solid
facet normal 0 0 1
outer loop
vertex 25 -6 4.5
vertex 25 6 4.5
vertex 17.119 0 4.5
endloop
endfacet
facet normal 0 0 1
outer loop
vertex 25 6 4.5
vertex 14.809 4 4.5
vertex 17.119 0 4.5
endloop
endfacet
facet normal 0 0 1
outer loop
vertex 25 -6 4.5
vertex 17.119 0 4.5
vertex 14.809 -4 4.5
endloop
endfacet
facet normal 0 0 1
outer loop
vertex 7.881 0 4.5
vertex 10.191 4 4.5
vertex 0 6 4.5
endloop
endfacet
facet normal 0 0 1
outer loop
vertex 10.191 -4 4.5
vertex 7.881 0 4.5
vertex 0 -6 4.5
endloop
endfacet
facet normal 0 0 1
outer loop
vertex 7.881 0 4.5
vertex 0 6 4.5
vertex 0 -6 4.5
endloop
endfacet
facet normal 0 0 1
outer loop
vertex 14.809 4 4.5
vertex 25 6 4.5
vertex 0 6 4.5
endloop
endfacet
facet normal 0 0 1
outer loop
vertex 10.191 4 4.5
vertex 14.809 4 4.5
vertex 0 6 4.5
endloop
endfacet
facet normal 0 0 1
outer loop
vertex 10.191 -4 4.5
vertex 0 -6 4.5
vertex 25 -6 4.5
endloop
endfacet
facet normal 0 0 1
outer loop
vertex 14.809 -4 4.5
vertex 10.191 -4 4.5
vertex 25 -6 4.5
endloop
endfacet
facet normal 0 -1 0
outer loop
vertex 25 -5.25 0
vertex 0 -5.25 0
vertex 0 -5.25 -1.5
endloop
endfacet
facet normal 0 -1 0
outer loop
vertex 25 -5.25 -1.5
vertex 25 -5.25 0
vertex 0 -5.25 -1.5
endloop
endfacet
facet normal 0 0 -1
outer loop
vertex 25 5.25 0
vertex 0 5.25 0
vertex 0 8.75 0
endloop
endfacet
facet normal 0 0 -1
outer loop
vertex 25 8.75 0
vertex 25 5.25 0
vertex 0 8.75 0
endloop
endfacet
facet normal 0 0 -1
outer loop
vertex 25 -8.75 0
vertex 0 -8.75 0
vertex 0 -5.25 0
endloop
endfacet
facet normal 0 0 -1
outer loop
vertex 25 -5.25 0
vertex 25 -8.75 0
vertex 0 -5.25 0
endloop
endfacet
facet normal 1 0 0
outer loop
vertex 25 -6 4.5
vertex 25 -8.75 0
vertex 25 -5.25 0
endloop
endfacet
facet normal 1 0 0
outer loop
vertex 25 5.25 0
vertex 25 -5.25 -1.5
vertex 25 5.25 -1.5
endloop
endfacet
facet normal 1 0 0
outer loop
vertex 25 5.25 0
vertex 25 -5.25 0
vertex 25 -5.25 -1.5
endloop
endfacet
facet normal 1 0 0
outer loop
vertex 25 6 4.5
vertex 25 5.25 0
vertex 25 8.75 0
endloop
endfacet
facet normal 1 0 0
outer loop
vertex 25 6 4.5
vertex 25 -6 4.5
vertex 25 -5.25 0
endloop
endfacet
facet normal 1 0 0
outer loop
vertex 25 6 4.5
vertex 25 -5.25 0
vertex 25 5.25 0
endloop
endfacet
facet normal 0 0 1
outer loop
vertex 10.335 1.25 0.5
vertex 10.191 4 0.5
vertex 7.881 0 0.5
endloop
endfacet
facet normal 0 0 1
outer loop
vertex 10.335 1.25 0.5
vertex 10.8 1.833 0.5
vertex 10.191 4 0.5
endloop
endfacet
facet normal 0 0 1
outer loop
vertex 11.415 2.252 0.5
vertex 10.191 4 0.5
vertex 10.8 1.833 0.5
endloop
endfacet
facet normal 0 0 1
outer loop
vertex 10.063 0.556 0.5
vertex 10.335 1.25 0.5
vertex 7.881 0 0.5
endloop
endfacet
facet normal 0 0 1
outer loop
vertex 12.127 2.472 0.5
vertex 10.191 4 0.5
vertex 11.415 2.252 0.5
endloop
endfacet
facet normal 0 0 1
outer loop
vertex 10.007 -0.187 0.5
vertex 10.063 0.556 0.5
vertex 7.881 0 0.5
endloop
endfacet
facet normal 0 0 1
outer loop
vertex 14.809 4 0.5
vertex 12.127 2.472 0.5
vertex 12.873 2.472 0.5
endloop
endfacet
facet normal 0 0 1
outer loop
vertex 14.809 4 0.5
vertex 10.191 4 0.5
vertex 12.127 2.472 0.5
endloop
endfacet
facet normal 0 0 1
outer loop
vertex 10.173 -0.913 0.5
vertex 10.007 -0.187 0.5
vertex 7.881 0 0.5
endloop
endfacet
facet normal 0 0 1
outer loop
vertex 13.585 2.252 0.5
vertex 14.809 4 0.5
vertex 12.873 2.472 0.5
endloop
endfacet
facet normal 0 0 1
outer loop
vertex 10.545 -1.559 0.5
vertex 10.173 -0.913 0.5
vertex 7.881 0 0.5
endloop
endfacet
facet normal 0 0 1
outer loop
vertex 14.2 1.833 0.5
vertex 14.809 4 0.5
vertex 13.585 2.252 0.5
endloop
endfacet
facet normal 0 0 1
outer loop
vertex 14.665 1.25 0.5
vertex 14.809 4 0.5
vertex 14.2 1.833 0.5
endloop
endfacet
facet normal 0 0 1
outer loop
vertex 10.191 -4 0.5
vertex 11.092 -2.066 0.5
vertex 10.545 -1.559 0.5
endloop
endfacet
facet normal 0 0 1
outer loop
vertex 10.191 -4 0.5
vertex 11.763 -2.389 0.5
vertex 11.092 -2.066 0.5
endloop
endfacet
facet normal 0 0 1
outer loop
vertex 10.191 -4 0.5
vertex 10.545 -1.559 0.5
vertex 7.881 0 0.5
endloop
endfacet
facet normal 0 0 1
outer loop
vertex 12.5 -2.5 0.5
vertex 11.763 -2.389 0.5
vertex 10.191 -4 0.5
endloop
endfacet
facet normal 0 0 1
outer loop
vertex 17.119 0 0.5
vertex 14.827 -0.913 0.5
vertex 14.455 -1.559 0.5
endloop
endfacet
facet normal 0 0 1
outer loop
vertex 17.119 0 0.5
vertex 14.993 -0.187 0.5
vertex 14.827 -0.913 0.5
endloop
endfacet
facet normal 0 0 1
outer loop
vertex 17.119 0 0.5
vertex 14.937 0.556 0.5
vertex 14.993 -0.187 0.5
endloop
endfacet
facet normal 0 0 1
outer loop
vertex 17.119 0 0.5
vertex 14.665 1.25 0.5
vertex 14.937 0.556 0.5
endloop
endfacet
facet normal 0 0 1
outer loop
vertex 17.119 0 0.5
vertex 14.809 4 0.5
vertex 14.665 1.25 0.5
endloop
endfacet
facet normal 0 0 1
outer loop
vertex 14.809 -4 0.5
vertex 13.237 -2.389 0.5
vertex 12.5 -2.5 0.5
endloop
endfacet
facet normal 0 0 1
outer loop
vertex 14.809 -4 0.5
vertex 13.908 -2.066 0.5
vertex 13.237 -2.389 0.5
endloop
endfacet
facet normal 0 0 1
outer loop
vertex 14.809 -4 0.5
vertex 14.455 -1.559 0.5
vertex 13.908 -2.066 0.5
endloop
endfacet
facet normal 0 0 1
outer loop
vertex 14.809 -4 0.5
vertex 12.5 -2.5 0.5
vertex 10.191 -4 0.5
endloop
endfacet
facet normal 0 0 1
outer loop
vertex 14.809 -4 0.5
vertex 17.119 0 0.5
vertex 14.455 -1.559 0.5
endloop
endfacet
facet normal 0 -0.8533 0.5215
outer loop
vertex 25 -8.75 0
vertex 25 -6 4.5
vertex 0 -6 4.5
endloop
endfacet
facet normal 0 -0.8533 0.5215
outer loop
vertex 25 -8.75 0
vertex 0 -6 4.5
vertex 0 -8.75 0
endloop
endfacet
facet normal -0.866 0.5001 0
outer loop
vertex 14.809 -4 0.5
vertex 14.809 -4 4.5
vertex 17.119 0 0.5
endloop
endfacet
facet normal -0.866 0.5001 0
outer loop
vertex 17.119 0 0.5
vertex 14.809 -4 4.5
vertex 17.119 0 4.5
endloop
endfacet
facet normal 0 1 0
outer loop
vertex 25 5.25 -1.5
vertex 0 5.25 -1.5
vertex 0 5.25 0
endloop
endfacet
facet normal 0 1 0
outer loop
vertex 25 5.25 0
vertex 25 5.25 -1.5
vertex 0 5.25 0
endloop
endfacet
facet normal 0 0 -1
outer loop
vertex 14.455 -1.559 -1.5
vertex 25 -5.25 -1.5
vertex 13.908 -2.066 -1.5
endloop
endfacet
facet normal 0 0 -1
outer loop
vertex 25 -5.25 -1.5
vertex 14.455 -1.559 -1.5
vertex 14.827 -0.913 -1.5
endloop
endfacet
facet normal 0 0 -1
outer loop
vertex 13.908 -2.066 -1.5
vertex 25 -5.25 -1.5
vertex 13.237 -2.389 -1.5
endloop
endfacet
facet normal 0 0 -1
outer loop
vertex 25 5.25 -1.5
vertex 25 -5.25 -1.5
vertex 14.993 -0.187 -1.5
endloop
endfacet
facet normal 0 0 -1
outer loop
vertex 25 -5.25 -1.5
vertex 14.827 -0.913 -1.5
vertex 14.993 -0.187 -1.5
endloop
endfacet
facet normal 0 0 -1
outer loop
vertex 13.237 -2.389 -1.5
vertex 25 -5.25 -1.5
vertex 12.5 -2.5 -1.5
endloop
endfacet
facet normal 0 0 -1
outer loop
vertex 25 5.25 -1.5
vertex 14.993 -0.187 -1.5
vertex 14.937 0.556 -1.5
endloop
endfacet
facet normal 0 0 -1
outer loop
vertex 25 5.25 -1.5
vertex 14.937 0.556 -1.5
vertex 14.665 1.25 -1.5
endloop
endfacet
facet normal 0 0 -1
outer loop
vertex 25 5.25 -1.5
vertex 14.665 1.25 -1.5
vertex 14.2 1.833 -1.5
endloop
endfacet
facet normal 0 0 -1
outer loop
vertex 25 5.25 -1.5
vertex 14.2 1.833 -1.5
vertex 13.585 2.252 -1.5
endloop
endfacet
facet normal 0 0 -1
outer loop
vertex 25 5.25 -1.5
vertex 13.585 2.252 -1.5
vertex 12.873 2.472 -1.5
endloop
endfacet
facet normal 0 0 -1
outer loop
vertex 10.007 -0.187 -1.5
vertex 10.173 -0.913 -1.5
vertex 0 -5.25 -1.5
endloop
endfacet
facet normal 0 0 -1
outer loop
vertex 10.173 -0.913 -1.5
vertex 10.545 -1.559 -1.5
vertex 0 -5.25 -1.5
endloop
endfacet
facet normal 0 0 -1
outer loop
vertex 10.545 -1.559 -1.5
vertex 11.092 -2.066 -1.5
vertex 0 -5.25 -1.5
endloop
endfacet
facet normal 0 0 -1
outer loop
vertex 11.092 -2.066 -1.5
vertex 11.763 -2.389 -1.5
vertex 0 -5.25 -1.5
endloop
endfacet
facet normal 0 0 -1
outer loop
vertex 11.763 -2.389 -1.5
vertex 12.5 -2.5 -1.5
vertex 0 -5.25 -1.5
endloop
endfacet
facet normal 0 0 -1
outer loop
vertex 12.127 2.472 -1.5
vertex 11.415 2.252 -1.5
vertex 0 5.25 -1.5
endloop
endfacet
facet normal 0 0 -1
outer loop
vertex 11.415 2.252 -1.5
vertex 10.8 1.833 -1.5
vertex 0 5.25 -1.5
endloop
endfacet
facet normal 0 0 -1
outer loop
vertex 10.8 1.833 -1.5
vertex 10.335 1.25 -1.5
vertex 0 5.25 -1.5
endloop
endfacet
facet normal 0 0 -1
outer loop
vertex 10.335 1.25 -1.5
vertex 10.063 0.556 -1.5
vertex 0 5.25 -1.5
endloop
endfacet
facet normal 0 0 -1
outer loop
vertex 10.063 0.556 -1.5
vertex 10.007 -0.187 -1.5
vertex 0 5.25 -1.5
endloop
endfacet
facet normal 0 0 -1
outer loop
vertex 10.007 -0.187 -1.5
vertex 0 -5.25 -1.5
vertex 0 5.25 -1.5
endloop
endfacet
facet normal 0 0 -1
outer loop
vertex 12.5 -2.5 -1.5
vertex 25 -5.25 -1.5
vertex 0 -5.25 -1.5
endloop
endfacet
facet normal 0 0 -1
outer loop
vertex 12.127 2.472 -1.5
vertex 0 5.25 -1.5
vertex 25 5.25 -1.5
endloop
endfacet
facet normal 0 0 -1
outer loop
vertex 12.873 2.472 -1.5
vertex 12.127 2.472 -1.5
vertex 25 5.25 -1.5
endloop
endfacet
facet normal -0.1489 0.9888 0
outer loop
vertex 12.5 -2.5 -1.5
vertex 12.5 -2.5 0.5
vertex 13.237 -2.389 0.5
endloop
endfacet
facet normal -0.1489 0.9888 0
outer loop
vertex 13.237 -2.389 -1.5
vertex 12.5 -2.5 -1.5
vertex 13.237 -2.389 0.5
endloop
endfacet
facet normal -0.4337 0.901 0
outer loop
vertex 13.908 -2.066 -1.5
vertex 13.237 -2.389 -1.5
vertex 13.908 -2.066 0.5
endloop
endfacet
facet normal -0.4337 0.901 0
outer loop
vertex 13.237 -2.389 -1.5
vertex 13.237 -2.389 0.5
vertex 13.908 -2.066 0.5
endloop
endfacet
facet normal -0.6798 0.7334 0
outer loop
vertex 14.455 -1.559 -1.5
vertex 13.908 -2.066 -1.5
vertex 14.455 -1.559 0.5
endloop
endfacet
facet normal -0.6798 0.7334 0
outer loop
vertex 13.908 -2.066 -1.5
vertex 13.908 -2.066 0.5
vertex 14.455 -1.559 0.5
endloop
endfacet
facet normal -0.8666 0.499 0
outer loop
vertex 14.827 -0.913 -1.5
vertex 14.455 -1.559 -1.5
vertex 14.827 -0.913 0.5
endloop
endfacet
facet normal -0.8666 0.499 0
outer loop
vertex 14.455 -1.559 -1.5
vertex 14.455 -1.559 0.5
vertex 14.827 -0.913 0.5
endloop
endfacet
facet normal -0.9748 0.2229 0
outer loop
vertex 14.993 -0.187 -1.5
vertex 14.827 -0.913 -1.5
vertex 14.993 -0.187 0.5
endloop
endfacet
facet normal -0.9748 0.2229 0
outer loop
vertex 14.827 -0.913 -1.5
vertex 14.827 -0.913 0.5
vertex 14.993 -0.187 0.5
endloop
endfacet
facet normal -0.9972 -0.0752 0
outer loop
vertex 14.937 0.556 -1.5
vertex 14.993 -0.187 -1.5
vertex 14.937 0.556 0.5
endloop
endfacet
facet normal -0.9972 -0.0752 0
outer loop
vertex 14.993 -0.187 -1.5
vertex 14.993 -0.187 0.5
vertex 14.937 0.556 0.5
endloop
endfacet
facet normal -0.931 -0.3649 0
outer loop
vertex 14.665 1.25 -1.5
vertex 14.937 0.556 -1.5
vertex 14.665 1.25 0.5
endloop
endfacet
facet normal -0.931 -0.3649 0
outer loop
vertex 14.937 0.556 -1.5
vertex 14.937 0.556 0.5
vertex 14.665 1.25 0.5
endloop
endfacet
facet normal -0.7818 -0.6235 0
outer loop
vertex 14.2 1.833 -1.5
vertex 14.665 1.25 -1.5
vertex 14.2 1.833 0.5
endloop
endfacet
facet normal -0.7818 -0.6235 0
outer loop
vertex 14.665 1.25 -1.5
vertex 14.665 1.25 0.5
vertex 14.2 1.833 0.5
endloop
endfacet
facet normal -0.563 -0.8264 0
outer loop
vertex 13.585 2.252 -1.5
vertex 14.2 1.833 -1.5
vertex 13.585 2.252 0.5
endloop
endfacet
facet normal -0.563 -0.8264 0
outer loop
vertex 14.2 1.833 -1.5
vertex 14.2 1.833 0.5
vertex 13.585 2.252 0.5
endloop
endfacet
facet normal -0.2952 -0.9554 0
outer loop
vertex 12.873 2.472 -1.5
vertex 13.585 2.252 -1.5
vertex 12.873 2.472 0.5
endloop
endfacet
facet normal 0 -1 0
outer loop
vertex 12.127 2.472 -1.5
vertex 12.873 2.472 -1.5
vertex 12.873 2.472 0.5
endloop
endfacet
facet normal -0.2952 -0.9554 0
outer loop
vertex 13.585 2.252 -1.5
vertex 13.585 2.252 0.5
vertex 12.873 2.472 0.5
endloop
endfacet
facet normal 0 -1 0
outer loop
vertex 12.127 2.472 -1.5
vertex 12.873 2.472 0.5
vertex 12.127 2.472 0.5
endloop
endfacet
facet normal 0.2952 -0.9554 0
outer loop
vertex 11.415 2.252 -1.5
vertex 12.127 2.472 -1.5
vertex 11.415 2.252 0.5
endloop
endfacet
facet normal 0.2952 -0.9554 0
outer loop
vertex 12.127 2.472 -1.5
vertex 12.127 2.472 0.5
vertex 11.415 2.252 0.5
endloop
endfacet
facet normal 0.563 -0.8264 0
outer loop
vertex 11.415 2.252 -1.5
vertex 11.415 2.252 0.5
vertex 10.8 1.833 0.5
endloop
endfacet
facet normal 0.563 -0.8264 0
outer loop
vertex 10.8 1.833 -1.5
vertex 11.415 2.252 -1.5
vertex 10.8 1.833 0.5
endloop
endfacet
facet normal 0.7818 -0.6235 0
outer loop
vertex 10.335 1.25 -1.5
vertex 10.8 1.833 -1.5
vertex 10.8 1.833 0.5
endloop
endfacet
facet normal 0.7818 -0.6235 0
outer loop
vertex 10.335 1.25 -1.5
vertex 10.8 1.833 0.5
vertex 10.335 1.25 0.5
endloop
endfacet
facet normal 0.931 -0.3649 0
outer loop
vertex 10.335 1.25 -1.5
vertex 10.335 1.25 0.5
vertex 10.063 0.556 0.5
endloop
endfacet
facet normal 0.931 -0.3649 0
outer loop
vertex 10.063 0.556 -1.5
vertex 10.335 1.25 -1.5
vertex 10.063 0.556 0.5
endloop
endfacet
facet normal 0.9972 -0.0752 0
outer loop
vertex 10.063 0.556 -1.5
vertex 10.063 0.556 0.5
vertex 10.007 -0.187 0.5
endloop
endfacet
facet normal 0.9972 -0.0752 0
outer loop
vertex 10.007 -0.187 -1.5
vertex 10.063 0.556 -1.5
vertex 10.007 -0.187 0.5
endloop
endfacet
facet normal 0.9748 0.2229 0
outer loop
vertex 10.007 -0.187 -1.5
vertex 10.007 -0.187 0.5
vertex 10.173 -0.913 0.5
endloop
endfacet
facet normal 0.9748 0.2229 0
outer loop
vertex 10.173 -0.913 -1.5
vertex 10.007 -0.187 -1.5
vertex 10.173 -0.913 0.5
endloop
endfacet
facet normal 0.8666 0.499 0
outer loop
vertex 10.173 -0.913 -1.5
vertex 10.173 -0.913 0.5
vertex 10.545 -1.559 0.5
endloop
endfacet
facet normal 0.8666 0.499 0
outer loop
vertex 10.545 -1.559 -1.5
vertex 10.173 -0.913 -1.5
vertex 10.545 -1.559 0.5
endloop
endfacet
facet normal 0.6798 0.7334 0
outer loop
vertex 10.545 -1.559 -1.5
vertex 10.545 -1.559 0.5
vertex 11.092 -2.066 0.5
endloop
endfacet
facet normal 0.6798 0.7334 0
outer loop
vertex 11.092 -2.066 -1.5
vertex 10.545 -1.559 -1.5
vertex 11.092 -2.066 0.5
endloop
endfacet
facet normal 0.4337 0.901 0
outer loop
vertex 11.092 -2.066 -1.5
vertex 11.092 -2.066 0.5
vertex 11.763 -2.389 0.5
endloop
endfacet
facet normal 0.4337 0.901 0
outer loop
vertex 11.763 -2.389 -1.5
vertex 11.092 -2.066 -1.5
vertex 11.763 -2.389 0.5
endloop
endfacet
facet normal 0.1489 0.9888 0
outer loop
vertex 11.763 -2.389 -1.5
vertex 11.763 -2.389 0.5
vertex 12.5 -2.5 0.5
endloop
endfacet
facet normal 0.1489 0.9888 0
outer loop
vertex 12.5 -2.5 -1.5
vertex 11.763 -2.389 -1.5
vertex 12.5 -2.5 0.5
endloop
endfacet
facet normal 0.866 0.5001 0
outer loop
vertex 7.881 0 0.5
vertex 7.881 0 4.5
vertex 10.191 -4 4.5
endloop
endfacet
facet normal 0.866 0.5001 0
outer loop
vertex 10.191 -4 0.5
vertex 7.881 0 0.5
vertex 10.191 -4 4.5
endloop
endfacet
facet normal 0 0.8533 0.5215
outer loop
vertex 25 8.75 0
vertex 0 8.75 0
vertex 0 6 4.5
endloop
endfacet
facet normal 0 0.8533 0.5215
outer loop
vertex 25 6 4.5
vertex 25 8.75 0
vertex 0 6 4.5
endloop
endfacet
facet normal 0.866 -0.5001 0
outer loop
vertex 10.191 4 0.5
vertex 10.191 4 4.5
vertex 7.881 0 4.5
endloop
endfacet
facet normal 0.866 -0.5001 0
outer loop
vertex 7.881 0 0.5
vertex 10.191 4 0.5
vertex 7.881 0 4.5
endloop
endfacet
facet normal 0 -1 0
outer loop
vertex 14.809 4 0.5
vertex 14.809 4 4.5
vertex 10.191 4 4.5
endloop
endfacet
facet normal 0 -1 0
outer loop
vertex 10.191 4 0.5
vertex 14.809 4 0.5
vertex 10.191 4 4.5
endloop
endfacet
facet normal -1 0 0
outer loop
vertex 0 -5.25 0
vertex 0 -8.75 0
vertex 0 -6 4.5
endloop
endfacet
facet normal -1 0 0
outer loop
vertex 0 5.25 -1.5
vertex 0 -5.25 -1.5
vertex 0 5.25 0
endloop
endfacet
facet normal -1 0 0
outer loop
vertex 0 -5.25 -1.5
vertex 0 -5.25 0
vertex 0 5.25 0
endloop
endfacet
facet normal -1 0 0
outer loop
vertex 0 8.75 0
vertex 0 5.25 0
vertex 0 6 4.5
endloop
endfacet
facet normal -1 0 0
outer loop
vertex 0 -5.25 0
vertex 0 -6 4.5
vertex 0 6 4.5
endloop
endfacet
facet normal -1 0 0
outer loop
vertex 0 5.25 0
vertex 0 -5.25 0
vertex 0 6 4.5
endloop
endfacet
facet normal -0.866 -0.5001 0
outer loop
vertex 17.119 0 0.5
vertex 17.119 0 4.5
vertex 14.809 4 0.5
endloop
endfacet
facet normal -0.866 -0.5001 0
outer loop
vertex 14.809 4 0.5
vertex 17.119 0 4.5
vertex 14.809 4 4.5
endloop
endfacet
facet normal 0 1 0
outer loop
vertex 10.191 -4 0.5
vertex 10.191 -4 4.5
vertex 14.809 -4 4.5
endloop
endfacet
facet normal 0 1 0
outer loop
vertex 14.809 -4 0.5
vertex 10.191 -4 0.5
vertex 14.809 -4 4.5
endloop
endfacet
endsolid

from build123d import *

# Parameters (mm, degrees)
PAD_DEPTH       = 25
POCKET_DEPTH    = 4
SKETCH002_R     = 2.5
POCKET001_DEPTH = 2.001


with BuildPart() as part:
    # Sketch → Pad (new body)
    with BuildSketch(Plane.YZ):
        Polygon((-5.25, -1.5), (5.25, -1.5), (5.25, 0), (8.75, 0), (6, 4.5), (-6, 4.5), (-8.75, 0), (-5.25, 0), align=None)
    extrude(amount=PAD_DEPTH)

    # Sketch001 (on Face5 of Pad) → Pocket (cut)
    with BuildSketch(Plane(origin=(0, 0, 4.5), x_dir=(0, -1, 0), z_dir=(0, 0, 1))):
        Polygon((4, 10.190599), (4, 14.809401), (0, 17.118802), (-4, 14.809401), (-4, 10.190599), (0, 7.881198), align=None)
    extrude(amount=-POCKET_DEPTH, mode=Mode.SUBTRACT)

    # Sketch002 (on Face17 of Pocket) → Pocket001 (cut, through all)
    with BuildSketch(Plane(origin=(0, 0, 0.5), x_dir=(0, -1, 0), z_dir=(0, 0, 1))):
        with Locations((0, 12.5)):
            Circle(SKETCH002_R)
    extrude(amount=-POCKET001_DEPTH, mode=Mode.SUBTRACT)


solid = part.part
